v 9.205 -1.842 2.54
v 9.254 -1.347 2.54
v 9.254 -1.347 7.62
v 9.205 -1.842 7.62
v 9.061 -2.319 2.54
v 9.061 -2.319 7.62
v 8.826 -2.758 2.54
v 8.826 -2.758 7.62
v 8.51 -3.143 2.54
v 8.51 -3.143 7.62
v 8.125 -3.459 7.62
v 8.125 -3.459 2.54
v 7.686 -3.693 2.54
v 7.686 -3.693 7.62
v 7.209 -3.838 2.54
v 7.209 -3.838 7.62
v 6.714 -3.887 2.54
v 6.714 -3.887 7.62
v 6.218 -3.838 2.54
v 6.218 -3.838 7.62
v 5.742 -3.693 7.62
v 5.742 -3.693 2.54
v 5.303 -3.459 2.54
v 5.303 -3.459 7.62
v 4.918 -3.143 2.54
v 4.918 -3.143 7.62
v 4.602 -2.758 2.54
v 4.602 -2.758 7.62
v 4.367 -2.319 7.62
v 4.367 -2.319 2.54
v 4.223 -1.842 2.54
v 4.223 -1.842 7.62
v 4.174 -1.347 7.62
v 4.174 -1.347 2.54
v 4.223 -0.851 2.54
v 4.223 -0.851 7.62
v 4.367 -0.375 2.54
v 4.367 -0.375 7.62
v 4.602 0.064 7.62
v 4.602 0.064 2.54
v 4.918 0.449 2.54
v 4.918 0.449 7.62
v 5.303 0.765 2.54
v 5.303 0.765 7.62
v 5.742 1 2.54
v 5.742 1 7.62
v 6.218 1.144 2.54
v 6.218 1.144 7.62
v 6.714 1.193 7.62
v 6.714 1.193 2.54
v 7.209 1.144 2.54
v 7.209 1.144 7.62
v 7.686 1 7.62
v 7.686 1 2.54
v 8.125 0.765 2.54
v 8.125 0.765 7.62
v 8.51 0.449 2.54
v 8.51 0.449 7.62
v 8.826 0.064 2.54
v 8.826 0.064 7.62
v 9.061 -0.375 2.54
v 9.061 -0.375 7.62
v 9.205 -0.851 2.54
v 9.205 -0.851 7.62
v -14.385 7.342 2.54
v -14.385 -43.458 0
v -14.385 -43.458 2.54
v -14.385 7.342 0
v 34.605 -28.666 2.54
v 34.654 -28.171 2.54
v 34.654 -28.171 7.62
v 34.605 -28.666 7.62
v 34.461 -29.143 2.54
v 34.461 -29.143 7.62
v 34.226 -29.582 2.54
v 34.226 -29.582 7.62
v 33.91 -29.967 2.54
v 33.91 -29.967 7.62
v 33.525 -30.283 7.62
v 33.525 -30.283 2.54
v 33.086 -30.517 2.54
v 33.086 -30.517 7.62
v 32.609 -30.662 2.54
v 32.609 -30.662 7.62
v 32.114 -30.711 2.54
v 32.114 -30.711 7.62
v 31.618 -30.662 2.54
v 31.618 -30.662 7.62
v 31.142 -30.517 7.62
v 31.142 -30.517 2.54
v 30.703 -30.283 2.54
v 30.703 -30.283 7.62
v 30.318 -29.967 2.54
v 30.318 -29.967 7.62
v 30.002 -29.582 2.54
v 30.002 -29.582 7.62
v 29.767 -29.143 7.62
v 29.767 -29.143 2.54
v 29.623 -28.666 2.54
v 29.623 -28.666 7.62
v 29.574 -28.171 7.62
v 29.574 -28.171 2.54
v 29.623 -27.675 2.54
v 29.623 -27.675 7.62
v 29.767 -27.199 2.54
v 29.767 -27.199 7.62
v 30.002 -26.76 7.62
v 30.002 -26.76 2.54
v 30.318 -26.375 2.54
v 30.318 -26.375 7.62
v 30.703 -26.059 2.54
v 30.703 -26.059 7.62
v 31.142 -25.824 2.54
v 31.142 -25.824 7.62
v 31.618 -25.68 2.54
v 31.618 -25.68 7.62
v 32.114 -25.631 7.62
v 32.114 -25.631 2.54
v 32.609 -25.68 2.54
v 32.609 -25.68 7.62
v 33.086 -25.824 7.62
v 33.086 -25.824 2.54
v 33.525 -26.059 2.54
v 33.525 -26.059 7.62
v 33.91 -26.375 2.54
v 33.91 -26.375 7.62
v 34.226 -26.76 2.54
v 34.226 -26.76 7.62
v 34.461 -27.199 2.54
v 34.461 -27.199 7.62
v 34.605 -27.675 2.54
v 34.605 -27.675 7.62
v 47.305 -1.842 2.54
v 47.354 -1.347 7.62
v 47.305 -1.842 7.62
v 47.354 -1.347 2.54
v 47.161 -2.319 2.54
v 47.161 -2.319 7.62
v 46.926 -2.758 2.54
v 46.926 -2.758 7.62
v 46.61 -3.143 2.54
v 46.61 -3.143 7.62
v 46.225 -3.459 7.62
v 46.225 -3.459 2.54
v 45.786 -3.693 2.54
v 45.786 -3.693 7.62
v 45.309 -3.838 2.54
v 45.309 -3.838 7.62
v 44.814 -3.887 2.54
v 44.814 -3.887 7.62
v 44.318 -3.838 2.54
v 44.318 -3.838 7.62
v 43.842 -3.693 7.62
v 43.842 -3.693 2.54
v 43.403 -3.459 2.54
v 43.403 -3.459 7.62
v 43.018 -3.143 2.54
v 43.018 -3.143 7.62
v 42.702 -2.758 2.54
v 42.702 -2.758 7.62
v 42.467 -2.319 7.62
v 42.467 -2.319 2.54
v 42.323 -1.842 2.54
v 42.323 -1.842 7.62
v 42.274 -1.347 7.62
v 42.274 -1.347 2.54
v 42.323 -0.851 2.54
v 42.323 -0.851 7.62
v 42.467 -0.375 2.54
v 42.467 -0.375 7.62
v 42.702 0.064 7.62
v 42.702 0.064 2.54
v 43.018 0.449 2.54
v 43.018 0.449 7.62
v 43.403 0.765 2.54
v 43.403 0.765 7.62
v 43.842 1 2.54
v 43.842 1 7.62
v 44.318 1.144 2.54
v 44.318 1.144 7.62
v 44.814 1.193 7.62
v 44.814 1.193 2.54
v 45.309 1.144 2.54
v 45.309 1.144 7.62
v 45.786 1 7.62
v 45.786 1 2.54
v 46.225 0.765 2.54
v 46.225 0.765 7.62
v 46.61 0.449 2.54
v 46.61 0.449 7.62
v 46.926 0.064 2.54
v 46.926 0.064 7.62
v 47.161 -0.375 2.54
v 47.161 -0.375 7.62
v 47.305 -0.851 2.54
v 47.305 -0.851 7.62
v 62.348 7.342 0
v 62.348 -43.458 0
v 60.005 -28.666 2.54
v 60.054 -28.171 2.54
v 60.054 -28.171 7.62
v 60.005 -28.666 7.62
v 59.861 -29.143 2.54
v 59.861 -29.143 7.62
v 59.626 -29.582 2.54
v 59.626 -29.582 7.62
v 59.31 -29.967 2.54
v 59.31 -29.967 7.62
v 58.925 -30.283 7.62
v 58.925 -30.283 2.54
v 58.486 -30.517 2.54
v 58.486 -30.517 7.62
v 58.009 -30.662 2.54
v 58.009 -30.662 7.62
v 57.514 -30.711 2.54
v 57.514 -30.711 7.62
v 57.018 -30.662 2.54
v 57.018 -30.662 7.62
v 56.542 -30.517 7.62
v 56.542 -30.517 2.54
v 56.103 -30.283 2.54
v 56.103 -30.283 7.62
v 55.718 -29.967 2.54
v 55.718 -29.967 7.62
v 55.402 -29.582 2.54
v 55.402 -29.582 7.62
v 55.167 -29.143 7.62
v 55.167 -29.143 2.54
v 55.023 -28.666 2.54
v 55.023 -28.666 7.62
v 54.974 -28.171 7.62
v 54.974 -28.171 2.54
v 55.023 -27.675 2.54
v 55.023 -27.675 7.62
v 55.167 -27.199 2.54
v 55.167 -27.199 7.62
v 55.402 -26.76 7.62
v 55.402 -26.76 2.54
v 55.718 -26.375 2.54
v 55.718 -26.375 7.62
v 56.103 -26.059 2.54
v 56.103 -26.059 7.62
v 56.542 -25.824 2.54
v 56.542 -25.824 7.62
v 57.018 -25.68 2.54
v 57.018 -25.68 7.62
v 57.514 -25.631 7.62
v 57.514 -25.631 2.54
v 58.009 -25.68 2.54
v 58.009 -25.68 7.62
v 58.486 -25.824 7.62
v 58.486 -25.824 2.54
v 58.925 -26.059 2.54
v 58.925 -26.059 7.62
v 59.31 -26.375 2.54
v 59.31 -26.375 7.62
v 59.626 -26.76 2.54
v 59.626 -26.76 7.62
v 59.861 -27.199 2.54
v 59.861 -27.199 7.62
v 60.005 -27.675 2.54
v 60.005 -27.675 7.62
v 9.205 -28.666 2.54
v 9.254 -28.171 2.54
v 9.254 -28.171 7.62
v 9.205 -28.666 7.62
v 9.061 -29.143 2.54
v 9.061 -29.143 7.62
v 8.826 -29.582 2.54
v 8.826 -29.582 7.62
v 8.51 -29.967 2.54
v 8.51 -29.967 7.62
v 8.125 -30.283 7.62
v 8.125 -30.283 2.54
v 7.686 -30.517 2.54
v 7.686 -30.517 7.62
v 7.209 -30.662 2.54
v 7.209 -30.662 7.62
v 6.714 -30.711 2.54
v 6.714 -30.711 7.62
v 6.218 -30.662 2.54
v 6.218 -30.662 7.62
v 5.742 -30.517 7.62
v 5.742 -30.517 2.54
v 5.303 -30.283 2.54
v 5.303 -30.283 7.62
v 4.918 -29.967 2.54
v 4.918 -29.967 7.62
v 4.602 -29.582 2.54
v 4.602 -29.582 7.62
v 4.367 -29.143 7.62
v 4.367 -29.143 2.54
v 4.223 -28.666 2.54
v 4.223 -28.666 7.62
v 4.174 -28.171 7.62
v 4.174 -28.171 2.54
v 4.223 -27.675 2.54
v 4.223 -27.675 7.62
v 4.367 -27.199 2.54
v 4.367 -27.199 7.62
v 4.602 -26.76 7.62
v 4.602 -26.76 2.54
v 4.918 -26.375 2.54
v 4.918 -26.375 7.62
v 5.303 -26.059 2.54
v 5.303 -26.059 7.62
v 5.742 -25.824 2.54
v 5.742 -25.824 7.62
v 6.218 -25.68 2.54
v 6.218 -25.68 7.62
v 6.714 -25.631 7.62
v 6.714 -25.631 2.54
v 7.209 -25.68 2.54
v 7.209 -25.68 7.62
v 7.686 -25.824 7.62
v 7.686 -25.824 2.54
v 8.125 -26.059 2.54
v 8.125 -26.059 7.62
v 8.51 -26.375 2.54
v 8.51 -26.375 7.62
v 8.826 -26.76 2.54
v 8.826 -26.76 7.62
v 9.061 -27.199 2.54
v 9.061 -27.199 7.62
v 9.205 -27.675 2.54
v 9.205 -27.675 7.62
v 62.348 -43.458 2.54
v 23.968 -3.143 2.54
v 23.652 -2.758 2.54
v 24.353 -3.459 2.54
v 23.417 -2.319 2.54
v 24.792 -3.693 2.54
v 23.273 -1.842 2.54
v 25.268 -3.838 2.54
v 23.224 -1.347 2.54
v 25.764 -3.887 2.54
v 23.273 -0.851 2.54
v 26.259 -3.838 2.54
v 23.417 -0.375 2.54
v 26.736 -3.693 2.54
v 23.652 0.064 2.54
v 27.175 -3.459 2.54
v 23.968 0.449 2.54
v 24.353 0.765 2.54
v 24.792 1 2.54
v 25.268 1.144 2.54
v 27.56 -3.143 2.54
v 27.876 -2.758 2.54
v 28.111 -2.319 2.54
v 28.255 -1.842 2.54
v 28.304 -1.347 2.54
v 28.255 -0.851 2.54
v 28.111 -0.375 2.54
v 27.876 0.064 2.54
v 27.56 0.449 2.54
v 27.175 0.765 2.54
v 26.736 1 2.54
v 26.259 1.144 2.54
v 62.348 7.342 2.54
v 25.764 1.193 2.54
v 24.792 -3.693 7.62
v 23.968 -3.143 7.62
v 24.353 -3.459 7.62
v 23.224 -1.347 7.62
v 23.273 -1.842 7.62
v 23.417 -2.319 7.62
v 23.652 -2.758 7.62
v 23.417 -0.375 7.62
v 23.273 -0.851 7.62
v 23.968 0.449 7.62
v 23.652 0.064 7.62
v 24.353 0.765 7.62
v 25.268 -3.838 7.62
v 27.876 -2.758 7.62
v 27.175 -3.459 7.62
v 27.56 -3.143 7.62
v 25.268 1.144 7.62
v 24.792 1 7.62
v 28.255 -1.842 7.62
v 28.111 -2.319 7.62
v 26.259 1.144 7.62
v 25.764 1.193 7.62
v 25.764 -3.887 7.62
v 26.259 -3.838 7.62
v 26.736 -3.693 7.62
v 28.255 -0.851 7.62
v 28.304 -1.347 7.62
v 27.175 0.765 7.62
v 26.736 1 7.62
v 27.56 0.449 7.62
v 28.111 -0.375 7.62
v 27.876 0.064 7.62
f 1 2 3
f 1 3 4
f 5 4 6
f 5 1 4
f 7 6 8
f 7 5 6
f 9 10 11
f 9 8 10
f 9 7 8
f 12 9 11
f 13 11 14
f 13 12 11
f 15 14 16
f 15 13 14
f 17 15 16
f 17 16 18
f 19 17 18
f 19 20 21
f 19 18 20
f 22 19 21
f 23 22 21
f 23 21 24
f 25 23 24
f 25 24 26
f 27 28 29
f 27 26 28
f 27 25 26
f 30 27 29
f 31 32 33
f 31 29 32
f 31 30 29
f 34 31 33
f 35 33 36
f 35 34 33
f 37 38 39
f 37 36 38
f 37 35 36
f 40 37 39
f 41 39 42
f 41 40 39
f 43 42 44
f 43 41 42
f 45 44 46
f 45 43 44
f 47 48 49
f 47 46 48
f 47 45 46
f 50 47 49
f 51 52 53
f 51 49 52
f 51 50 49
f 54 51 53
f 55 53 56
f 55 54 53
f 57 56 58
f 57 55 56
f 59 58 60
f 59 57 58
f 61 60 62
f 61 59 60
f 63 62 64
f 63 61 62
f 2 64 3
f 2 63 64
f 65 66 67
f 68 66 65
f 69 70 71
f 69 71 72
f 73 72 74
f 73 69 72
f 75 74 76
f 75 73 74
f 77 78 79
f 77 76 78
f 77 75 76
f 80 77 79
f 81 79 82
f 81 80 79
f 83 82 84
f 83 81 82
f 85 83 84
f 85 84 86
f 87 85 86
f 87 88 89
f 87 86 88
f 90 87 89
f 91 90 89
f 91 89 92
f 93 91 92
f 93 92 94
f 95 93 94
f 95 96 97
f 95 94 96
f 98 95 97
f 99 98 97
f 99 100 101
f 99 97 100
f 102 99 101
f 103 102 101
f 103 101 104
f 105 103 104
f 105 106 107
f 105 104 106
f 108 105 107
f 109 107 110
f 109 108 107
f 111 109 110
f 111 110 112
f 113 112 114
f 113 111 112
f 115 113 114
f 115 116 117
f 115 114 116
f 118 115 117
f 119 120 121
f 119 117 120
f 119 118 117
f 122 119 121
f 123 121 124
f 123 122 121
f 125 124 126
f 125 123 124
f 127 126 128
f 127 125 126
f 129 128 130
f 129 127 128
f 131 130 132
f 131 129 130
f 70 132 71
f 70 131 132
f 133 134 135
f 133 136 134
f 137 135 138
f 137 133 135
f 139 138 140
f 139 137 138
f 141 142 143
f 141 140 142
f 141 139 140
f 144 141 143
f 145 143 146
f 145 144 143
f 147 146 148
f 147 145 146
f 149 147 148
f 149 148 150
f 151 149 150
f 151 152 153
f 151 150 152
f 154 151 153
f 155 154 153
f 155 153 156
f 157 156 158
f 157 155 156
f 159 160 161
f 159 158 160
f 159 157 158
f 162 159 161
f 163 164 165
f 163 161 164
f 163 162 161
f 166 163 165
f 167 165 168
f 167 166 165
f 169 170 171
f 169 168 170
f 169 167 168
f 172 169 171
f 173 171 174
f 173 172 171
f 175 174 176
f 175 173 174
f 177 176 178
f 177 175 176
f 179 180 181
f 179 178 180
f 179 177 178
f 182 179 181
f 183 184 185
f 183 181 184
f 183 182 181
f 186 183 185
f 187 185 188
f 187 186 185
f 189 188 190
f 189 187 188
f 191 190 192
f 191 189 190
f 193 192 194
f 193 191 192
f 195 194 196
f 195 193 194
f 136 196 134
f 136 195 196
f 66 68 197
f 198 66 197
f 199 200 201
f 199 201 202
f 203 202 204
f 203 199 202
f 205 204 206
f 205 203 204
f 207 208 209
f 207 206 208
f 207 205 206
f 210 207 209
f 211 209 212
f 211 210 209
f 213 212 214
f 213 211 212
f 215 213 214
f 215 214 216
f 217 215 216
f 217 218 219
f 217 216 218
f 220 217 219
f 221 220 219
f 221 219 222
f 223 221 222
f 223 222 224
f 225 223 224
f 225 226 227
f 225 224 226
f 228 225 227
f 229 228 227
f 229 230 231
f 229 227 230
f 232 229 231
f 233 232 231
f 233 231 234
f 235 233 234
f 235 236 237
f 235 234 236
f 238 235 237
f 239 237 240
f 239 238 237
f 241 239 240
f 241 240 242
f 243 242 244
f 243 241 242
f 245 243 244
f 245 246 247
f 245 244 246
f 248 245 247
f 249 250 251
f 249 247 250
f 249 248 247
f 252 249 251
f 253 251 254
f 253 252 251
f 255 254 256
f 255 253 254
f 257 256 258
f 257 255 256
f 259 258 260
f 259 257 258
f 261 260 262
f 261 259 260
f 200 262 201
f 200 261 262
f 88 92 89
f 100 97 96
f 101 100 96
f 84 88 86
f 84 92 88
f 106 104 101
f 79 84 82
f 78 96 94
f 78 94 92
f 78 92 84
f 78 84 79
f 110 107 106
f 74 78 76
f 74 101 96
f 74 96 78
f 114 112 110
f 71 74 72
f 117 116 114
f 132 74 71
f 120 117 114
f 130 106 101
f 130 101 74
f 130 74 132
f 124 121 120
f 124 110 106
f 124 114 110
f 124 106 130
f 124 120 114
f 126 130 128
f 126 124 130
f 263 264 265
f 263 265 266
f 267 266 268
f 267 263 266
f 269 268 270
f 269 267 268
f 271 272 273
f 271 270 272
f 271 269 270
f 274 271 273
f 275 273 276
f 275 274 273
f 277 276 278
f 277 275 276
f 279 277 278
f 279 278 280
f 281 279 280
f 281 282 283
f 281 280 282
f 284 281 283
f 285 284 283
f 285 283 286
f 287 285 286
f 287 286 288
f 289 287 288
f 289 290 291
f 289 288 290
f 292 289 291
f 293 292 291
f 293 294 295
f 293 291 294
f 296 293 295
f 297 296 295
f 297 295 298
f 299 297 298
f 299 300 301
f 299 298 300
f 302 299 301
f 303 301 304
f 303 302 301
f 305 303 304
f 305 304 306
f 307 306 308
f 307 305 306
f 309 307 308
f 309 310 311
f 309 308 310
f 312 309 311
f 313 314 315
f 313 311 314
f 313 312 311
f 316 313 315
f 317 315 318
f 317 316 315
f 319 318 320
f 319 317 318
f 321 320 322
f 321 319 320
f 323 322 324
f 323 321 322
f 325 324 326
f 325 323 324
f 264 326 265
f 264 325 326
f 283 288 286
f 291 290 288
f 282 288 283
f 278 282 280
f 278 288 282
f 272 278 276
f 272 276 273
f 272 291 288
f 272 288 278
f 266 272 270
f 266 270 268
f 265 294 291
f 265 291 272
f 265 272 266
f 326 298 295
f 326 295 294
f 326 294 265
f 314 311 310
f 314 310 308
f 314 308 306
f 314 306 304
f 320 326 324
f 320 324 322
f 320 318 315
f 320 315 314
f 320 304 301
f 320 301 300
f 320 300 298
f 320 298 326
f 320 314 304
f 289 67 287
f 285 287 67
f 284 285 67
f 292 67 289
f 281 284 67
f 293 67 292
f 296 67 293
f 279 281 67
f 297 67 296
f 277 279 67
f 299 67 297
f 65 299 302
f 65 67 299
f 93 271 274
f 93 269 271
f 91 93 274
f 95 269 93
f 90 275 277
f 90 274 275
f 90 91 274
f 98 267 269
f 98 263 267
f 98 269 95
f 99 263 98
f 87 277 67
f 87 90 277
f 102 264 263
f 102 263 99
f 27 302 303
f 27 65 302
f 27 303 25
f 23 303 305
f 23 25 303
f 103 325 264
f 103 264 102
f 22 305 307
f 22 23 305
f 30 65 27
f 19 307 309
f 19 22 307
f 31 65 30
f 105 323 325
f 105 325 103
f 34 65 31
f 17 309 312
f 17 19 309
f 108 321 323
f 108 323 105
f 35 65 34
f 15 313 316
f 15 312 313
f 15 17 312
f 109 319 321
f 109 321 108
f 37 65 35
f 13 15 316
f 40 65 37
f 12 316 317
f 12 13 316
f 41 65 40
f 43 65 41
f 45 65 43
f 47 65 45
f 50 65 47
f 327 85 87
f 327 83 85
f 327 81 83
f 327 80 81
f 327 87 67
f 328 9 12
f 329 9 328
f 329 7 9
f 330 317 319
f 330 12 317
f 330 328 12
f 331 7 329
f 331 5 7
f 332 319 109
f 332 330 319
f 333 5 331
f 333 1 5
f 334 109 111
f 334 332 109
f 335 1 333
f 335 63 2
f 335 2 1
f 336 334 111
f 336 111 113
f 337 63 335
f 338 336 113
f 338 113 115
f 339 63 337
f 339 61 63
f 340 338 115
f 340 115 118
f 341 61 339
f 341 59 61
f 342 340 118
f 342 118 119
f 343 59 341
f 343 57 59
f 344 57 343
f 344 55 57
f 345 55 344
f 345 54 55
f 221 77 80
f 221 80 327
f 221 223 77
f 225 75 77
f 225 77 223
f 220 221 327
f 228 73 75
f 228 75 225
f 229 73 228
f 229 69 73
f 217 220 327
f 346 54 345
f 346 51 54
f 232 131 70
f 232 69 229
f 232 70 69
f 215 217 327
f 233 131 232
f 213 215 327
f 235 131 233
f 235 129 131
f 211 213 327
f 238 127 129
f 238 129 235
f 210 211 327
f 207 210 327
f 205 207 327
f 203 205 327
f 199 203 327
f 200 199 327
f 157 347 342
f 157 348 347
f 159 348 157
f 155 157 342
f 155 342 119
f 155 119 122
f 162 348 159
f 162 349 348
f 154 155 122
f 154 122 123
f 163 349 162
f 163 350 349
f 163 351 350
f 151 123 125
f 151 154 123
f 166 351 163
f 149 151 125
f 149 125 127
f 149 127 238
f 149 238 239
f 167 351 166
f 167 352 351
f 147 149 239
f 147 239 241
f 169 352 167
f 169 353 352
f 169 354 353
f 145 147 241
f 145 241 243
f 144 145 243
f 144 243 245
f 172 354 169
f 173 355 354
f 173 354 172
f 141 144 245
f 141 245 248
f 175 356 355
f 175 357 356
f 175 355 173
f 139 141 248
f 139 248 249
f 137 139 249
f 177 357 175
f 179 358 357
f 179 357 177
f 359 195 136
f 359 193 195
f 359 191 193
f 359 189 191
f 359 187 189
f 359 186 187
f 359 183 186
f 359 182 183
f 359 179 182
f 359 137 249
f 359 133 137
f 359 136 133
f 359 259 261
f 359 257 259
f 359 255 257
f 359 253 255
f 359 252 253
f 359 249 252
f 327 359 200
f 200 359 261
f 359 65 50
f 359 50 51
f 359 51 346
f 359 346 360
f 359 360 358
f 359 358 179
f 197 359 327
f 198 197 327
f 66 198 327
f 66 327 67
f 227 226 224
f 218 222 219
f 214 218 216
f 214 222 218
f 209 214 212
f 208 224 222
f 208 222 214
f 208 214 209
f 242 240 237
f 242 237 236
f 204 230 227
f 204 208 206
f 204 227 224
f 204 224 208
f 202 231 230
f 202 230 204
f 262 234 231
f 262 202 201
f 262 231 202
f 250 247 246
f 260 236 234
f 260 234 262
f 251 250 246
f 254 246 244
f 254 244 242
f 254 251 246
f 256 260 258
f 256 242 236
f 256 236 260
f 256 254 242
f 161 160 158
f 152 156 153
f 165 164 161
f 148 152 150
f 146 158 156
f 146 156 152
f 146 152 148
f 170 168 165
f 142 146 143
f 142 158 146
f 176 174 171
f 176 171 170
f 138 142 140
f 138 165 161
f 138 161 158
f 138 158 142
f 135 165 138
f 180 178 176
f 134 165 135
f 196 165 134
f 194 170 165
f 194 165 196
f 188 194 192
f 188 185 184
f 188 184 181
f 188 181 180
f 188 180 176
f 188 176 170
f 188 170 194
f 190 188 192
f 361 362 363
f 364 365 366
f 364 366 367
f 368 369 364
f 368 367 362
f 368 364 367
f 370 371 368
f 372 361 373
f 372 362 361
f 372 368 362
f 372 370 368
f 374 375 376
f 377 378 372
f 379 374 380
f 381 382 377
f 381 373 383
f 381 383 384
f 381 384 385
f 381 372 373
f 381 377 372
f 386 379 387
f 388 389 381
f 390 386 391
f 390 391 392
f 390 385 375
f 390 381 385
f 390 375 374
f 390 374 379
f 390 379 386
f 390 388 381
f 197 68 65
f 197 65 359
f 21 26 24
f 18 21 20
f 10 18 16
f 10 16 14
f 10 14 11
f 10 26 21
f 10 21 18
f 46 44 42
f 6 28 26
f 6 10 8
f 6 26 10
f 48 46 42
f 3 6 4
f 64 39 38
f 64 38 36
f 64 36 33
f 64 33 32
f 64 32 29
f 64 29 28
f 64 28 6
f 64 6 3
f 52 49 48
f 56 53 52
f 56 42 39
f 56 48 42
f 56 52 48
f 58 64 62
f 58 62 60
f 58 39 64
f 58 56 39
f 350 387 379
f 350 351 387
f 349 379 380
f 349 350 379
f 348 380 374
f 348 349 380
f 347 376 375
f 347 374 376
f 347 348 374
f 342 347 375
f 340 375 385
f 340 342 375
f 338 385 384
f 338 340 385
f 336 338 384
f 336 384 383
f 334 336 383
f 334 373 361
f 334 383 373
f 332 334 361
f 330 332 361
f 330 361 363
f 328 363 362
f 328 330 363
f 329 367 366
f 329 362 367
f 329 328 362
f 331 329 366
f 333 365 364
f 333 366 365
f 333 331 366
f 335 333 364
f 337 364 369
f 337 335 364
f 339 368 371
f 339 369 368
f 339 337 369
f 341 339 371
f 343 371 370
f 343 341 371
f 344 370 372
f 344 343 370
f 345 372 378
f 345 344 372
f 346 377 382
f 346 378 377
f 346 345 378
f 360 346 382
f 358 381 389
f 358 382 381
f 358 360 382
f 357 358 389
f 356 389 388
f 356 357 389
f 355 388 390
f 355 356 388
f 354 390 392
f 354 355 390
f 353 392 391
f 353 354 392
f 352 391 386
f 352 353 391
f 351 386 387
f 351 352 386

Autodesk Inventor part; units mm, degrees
ref_plane "YZ Plane" through (0, 0, 0) normal (1, 0, 0) x (0, 1, 0)
ref_plane "XZ Plane" through (0, 0, 0) normal (0, 1, 0) x (-1, 0, 0)
ref_plane "XY Plane" through (0, 0, 0) normal (0, 0, 1) x (1, 0, 0)
sketch "Sketch1" plane through (0, 0, 0) normal (0, 0, 1) x (1, 0, 0)
  line L0 (-14.3848, 7.3422) -> (87.2152, 7.3422)
  line L1 (87.2152, 7.3422) -> (87.2152, -43.4578)
  line L2 (87.2152, -43.4578) -> (-14.3848, -43.4578)
  line L3 (-14.3848, -43.4578) -> (-14.3848, 7.3422)
  point P0 (0, 0)
  dimension "d0" = 101.6
  dimension "d1" = 50.8
extrude "Extrusion1" add sketch "Sketch1" along normal blind 2.54
sketch "Sketch2" plane through (0, 0, 2.54) normal (0, 0, 1) x (1, 0, 0)
  circle A0 centre (6.7139, -1.3468) radius 2.54
  line L0 (6.7139, -1.3468) -> (25.7639, -1.3468) construction
  circle A1 centre (25.7639, -1.3468) radius 2.54
  line L1 (25.7639, -1.3468) -> (44.8139, -1.3468) construction
  circle A2 centre (44.8139, -1.3468) radius 2.54
  line L2 (-14.3848, 7.3422) -> (-14.3848, -43.4578) projected
  line L3 (-14.3848, -18.0578) -> (87.2152, -18.0578) construction
  line L4 (87.2152, -43.4578) -> (87.2152, 7.3422) projected
  circle A3 centre (6.7139, -28.1707) radius 2.54
  line L5 (6.7139, -28.1707) -> (32.1139, -28.1707) construction
  circle A4 centre (32.1139, -28.1707) radius 2.54
  line L6 (32.1139, -28.1707) -> (57.5139, -28.1707) construction
  circle A5 centre (57.5139, -28.1707) radius 2.54
  point P0 (0, 0)
  dimension "d4" = 5.08
  dimension "d5" = 19.05
  dimension "d6" = 5.08
  dimension "d7" = 19.05
  dimension "d8" = 5.08
  dimension "d9" = 5.08
  dimension "d10" = 25.4
  dimension "d11" = 5.08
  dimension "d12" = 25.4
  dimension "d13" = 5.08
extrude "Extrusion2" add sketch "Sketch2" along normal blind 5.08
sketch "Sketch3" plane through (0, 0, 2.54) normal (0, 0, 1) x (1, 0, 0)
  line L0 (87.2152, -43.4578) -> (87.2152, 7.3422) projected
  line L1 (-14.3848, -43.4578) -> (87.2152, -43.4578) projected
  line L2 (87.2152, 7.3422) -> (62.3485, 7.3422)
  line L3 (62.3485, 7.3422) -> (62.3485, -43.4578)
  line L4 (62.3485, -43.4578) -> (87.2152, -43.4578)
  line L5 (87.2152, -43.4578) -> (87.2152, 7.3422)
  point P0 (0, 0)
extrude "Extrusion3" cut sketch "Sketch3" against normal blind 5.08
properties part number "Backdrop base"
